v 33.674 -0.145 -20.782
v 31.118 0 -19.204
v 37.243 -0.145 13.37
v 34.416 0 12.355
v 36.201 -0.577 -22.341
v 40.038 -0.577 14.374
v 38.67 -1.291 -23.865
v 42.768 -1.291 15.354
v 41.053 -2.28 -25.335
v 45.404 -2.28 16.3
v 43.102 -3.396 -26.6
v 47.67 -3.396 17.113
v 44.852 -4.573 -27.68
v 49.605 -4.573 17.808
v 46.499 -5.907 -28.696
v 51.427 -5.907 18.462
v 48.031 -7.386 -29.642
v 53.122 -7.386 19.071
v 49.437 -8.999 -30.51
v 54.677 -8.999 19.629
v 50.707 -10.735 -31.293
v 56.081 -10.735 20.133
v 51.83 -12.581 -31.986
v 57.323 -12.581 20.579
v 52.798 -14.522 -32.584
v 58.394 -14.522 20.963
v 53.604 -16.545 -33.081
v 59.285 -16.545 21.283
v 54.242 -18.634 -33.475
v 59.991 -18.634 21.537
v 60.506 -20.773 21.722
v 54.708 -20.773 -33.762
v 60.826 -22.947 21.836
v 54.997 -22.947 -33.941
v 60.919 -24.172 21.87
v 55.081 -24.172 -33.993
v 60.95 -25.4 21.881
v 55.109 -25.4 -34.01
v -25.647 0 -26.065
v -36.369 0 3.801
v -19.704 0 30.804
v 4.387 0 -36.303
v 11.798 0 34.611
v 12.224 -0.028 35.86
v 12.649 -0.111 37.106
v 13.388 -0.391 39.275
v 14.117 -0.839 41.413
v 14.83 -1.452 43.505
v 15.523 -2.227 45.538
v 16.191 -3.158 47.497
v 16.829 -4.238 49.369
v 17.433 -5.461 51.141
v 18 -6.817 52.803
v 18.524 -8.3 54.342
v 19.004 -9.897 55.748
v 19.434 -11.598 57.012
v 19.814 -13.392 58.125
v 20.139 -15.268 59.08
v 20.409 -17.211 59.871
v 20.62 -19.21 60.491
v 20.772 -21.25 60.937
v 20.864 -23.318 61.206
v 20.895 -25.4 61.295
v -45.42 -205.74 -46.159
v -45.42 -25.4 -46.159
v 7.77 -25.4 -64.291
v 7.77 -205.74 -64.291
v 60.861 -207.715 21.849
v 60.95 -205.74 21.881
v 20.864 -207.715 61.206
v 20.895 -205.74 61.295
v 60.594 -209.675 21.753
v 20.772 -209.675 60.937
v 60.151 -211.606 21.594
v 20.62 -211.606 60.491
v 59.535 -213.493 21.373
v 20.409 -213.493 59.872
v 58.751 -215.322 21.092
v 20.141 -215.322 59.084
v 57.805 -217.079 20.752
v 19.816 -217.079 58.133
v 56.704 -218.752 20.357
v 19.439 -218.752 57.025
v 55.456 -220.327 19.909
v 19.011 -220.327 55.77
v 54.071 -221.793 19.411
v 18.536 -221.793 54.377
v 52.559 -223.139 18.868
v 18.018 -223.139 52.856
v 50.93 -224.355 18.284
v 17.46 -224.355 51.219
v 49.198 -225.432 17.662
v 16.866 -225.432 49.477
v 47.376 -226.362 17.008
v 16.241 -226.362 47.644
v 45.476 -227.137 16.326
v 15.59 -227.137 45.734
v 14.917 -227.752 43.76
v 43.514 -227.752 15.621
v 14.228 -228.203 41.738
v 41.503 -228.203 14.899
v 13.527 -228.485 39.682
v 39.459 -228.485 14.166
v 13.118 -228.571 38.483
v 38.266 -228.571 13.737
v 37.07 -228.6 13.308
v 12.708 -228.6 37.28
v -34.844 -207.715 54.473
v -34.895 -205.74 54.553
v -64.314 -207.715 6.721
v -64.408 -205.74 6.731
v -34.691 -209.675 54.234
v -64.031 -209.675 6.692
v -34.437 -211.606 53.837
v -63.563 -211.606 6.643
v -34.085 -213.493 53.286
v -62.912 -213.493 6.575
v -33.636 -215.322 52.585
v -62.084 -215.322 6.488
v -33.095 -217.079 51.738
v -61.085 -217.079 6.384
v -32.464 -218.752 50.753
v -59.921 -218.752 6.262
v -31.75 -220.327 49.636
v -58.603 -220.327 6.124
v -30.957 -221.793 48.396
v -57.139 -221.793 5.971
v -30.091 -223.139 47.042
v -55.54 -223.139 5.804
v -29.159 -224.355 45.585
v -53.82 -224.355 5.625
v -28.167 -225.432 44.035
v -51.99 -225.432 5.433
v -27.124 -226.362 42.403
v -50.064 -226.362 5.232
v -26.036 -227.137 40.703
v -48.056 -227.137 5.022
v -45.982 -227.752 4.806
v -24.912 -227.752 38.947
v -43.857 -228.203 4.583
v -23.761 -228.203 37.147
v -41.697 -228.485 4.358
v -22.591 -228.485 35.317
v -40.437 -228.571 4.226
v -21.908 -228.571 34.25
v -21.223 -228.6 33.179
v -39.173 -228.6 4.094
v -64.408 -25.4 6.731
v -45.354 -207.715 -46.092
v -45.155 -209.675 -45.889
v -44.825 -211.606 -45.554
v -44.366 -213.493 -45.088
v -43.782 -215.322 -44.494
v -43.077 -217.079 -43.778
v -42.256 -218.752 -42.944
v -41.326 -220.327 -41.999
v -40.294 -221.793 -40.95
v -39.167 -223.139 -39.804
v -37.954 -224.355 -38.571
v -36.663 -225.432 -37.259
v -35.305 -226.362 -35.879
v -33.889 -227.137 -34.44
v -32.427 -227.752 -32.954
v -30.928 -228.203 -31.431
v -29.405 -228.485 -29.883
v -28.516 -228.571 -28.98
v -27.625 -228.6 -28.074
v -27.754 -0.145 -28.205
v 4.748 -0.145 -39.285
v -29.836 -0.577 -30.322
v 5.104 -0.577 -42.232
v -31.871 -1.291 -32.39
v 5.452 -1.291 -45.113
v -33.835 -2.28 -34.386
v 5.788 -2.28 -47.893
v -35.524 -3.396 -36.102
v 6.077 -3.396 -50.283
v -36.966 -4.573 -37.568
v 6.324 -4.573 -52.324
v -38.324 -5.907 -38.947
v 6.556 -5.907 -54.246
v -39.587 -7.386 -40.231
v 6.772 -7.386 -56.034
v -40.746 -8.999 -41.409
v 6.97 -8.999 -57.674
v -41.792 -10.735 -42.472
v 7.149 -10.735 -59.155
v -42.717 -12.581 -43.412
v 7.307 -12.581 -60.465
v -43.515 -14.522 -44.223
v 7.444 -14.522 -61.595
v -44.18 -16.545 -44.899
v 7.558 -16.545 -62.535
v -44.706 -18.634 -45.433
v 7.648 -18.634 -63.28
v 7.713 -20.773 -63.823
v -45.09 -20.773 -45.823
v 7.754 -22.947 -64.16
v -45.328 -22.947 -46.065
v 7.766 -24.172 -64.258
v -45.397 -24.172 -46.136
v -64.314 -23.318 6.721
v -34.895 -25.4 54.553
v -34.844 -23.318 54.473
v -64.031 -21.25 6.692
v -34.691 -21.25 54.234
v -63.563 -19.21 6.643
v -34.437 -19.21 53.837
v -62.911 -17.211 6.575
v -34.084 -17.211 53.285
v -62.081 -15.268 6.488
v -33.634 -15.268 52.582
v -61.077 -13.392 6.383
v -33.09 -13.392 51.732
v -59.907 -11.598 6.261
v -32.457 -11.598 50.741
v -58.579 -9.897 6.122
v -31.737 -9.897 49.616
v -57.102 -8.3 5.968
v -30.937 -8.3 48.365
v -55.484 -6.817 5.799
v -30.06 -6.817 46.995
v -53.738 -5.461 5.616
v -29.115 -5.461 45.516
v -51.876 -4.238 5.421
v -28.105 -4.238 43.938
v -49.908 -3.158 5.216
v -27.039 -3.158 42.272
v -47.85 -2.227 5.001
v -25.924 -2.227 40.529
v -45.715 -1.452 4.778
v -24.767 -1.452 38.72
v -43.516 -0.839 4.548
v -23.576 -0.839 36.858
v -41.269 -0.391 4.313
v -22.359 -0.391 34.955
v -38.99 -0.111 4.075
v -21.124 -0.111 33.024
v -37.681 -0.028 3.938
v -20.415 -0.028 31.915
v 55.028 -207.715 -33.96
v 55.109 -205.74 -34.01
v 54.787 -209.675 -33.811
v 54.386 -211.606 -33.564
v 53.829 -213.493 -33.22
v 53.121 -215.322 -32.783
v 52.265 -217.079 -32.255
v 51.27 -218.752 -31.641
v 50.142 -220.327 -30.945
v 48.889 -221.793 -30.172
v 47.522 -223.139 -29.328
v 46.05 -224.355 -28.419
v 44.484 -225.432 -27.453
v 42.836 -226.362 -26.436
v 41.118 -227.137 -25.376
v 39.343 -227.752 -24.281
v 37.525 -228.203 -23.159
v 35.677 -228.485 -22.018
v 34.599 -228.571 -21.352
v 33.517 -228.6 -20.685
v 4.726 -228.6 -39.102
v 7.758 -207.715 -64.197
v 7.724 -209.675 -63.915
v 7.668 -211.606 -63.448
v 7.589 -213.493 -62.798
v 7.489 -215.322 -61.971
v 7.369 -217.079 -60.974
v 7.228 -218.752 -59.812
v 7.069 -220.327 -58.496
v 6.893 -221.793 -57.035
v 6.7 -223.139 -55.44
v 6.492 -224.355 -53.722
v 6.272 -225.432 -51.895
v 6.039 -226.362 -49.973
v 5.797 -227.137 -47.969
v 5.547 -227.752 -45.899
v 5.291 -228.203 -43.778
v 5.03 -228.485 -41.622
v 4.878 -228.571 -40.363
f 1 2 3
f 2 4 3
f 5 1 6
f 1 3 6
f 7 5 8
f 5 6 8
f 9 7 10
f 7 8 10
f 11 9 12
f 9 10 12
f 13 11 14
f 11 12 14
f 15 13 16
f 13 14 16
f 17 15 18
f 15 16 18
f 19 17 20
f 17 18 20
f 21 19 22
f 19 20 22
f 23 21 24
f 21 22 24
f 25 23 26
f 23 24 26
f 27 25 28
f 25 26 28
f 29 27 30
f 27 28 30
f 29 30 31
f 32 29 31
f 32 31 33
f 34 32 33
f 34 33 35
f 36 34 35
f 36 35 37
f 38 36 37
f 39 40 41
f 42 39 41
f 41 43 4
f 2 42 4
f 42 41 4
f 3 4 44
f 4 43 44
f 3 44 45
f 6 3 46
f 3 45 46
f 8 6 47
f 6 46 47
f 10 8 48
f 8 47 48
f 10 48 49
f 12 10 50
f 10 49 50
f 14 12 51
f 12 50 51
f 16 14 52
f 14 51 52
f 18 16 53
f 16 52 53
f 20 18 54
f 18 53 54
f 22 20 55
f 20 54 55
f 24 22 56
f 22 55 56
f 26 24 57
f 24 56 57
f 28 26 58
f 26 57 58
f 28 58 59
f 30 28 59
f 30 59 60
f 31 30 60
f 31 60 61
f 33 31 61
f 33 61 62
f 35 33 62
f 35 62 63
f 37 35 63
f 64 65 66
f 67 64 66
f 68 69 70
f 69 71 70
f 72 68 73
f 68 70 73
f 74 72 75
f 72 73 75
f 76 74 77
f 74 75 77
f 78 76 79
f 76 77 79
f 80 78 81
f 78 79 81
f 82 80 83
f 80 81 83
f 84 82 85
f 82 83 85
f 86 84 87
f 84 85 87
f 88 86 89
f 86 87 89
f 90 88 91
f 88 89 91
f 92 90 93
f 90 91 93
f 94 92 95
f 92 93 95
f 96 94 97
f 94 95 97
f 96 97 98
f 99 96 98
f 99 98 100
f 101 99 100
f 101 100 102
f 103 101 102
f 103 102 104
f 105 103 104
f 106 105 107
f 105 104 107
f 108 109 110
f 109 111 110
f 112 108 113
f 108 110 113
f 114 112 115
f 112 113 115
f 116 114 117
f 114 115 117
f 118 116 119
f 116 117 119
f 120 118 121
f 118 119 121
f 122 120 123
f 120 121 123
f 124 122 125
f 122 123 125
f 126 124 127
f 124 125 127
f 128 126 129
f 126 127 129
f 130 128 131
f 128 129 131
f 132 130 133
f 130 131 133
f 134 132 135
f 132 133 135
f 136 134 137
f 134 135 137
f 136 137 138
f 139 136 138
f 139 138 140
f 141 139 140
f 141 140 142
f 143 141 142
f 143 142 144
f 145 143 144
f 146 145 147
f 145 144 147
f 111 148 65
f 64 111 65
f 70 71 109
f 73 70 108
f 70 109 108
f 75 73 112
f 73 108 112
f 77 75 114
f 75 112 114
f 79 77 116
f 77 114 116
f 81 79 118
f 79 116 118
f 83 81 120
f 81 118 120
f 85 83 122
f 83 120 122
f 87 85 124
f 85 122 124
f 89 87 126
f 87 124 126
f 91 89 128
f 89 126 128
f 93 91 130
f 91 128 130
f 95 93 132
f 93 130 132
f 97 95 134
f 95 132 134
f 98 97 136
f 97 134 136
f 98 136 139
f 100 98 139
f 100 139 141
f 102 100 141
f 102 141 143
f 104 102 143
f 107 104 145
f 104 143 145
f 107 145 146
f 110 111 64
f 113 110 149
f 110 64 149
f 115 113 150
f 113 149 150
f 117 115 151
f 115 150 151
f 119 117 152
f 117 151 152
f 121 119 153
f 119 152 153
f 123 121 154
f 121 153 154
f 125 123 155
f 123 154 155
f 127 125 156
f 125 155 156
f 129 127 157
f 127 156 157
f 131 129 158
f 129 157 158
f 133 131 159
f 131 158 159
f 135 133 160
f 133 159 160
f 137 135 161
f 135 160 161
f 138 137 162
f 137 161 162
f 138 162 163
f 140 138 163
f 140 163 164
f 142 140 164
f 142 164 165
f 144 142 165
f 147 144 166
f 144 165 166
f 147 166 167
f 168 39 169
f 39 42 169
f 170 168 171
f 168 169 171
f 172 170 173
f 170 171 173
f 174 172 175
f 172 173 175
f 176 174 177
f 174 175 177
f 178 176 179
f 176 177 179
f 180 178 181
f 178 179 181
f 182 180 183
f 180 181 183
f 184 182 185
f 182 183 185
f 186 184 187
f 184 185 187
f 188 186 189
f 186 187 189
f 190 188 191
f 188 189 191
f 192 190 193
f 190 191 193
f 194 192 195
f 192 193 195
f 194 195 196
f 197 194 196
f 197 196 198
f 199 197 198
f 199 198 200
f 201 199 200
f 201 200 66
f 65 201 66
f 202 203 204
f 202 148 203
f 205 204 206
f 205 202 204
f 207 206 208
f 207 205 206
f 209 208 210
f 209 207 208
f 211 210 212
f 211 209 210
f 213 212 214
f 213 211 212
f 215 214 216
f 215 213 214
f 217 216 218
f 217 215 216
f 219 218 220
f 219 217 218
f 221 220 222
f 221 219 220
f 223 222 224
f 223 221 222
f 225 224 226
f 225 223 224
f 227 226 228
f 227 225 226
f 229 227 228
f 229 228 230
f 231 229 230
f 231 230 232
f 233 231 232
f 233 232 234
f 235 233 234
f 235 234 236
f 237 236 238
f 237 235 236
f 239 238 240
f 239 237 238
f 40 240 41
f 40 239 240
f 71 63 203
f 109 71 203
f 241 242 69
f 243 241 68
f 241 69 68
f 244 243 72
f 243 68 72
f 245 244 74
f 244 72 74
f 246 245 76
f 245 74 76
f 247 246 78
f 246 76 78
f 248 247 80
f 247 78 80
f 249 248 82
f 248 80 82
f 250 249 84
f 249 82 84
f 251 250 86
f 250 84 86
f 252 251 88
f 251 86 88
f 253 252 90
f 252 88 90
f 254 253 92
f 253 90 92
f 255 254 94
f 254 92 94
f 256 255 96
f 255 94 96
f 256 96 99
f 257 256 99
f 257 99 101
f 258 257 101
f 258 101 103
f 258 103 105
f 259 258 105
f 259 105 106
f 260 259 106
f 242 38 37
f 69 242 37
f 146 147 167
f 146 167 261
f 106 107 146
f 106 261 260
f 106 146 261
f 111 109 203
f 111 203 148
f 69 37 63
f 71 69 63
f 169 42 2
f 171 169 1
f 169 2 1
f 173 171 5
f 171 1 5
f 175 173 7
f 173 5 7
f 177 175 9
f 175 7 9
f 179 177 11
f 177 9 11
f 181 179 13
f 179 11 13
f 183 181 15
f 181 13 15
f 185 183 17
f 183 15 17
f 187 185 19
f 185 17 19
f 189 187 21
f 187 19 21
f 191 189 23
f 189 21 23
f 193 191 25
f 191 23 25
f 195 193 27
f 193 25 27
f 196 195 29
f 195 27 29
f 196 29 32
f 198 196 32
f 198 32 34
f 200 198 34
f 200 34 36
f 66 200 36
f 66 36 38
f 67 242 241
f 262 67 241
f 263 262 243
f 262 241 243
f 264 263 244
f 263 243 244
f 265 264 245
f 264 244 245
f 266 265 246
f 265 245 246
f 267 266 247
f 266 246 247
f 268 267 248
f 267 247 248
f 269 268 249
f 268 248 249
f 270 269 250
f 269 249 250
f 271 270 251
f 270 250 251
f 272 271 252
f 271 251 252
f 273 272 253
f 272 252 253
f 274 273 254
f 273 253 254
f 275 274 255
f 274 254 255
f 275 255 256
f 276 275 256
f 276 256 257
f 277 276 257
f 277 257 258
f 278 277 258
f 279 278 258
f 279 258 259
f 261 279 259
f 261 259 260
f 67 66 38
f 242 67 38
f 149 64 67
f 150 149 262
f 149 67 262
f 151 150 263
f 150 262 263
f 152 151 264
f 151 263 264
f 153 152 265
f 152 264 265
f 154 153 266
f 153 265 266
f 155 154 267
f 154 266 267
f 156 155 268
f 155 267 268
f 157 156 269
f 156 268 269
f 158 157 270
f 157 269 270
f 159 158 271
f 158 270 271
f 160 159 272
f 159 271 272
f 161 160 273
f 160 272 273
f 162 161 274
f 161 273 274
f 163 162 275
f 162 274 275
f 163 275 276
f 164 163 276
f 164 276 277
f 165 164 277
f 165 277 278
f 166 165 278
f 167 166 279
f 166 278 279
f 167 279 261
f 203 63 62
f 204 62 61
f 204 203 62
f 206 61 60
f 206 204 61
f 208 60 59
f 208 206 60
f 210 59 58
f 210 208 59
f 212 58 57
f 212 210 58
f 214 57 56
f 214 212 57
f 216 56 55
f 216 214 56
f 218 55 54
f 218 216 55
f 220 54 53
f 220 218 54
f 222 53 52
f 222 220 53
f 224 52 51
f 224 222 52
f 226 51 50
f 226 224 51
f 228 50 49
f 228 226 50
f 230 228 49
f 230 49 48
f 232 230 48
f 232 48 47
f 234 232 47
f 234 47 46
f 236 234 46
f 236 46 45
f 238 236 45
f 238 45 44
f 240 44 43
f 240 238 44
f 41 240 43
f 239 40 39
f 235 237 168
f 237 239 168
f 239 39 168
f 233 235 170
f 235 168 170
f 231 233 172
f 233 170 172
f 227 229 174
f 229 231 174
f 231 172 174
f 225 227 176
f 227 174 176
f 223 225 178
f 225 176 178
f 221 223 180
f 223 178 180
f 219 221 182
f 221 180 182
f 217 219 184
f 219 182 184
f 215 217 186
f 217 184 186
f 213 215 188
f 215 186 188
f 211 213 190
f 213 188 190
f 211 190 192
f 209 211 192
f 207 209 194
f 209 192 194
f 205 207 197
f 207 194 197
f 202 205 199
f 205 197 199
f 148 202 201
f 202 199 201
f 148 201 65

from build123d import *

# Parameters (mm, degrees)
F1_DEPTH = 228.6
F2_R     = 22.86
F3_R     = 25.4


with BuildPart() as f1:
    # F0 (on Front) → F1 (new body)
    with BuildSketch(Plane.XZ):
        Polygon((-34.895125, 54.553078), (-64.408069, 6.731181), (-45.420423, -46.159433), (7.769728, -64.291052), (55.109115, -34.010198), (60.950214, 21.881029), (20.89456, 61.295395), align=None)
    extrude(amount=F1_DEPTH)

    # F2
    f2_edges = [f1.edges().sort_by_distance(p)[0] for p in [
        (-7.000283, -228.6, 57.924237),
        (-49.651597, -228.6, 30.642129),
        (-54.914246, -228.6, -19.714126),
        (-18.825348, -228.6, -55.225243),
        (31.439421, -228.6, -49.150625),
        (58.029665, -228.6, -6.064584),
        (40.922387, -228.6, 41.588212),
    ]]
    fillet(f2_edges, radius=F2_R)

    # F3
    f3_edges = [f1.edges().sort_by_distance(p)[0] for p in [
        (-7.000283, 0, 57.924237),
        (-49.651597, 0, 30.642129),
        (-54.914246, 0, -19.714126),
        (-18.825348, 0, -55.225243),
        (31.439421, 0, -49.150625),
        (58.029665, 0, -6.064584),
        (40.922387, 0, 41.588212),
    ]]
    fillet(f3_edges, radius=F3_R)


solid = f1.part
